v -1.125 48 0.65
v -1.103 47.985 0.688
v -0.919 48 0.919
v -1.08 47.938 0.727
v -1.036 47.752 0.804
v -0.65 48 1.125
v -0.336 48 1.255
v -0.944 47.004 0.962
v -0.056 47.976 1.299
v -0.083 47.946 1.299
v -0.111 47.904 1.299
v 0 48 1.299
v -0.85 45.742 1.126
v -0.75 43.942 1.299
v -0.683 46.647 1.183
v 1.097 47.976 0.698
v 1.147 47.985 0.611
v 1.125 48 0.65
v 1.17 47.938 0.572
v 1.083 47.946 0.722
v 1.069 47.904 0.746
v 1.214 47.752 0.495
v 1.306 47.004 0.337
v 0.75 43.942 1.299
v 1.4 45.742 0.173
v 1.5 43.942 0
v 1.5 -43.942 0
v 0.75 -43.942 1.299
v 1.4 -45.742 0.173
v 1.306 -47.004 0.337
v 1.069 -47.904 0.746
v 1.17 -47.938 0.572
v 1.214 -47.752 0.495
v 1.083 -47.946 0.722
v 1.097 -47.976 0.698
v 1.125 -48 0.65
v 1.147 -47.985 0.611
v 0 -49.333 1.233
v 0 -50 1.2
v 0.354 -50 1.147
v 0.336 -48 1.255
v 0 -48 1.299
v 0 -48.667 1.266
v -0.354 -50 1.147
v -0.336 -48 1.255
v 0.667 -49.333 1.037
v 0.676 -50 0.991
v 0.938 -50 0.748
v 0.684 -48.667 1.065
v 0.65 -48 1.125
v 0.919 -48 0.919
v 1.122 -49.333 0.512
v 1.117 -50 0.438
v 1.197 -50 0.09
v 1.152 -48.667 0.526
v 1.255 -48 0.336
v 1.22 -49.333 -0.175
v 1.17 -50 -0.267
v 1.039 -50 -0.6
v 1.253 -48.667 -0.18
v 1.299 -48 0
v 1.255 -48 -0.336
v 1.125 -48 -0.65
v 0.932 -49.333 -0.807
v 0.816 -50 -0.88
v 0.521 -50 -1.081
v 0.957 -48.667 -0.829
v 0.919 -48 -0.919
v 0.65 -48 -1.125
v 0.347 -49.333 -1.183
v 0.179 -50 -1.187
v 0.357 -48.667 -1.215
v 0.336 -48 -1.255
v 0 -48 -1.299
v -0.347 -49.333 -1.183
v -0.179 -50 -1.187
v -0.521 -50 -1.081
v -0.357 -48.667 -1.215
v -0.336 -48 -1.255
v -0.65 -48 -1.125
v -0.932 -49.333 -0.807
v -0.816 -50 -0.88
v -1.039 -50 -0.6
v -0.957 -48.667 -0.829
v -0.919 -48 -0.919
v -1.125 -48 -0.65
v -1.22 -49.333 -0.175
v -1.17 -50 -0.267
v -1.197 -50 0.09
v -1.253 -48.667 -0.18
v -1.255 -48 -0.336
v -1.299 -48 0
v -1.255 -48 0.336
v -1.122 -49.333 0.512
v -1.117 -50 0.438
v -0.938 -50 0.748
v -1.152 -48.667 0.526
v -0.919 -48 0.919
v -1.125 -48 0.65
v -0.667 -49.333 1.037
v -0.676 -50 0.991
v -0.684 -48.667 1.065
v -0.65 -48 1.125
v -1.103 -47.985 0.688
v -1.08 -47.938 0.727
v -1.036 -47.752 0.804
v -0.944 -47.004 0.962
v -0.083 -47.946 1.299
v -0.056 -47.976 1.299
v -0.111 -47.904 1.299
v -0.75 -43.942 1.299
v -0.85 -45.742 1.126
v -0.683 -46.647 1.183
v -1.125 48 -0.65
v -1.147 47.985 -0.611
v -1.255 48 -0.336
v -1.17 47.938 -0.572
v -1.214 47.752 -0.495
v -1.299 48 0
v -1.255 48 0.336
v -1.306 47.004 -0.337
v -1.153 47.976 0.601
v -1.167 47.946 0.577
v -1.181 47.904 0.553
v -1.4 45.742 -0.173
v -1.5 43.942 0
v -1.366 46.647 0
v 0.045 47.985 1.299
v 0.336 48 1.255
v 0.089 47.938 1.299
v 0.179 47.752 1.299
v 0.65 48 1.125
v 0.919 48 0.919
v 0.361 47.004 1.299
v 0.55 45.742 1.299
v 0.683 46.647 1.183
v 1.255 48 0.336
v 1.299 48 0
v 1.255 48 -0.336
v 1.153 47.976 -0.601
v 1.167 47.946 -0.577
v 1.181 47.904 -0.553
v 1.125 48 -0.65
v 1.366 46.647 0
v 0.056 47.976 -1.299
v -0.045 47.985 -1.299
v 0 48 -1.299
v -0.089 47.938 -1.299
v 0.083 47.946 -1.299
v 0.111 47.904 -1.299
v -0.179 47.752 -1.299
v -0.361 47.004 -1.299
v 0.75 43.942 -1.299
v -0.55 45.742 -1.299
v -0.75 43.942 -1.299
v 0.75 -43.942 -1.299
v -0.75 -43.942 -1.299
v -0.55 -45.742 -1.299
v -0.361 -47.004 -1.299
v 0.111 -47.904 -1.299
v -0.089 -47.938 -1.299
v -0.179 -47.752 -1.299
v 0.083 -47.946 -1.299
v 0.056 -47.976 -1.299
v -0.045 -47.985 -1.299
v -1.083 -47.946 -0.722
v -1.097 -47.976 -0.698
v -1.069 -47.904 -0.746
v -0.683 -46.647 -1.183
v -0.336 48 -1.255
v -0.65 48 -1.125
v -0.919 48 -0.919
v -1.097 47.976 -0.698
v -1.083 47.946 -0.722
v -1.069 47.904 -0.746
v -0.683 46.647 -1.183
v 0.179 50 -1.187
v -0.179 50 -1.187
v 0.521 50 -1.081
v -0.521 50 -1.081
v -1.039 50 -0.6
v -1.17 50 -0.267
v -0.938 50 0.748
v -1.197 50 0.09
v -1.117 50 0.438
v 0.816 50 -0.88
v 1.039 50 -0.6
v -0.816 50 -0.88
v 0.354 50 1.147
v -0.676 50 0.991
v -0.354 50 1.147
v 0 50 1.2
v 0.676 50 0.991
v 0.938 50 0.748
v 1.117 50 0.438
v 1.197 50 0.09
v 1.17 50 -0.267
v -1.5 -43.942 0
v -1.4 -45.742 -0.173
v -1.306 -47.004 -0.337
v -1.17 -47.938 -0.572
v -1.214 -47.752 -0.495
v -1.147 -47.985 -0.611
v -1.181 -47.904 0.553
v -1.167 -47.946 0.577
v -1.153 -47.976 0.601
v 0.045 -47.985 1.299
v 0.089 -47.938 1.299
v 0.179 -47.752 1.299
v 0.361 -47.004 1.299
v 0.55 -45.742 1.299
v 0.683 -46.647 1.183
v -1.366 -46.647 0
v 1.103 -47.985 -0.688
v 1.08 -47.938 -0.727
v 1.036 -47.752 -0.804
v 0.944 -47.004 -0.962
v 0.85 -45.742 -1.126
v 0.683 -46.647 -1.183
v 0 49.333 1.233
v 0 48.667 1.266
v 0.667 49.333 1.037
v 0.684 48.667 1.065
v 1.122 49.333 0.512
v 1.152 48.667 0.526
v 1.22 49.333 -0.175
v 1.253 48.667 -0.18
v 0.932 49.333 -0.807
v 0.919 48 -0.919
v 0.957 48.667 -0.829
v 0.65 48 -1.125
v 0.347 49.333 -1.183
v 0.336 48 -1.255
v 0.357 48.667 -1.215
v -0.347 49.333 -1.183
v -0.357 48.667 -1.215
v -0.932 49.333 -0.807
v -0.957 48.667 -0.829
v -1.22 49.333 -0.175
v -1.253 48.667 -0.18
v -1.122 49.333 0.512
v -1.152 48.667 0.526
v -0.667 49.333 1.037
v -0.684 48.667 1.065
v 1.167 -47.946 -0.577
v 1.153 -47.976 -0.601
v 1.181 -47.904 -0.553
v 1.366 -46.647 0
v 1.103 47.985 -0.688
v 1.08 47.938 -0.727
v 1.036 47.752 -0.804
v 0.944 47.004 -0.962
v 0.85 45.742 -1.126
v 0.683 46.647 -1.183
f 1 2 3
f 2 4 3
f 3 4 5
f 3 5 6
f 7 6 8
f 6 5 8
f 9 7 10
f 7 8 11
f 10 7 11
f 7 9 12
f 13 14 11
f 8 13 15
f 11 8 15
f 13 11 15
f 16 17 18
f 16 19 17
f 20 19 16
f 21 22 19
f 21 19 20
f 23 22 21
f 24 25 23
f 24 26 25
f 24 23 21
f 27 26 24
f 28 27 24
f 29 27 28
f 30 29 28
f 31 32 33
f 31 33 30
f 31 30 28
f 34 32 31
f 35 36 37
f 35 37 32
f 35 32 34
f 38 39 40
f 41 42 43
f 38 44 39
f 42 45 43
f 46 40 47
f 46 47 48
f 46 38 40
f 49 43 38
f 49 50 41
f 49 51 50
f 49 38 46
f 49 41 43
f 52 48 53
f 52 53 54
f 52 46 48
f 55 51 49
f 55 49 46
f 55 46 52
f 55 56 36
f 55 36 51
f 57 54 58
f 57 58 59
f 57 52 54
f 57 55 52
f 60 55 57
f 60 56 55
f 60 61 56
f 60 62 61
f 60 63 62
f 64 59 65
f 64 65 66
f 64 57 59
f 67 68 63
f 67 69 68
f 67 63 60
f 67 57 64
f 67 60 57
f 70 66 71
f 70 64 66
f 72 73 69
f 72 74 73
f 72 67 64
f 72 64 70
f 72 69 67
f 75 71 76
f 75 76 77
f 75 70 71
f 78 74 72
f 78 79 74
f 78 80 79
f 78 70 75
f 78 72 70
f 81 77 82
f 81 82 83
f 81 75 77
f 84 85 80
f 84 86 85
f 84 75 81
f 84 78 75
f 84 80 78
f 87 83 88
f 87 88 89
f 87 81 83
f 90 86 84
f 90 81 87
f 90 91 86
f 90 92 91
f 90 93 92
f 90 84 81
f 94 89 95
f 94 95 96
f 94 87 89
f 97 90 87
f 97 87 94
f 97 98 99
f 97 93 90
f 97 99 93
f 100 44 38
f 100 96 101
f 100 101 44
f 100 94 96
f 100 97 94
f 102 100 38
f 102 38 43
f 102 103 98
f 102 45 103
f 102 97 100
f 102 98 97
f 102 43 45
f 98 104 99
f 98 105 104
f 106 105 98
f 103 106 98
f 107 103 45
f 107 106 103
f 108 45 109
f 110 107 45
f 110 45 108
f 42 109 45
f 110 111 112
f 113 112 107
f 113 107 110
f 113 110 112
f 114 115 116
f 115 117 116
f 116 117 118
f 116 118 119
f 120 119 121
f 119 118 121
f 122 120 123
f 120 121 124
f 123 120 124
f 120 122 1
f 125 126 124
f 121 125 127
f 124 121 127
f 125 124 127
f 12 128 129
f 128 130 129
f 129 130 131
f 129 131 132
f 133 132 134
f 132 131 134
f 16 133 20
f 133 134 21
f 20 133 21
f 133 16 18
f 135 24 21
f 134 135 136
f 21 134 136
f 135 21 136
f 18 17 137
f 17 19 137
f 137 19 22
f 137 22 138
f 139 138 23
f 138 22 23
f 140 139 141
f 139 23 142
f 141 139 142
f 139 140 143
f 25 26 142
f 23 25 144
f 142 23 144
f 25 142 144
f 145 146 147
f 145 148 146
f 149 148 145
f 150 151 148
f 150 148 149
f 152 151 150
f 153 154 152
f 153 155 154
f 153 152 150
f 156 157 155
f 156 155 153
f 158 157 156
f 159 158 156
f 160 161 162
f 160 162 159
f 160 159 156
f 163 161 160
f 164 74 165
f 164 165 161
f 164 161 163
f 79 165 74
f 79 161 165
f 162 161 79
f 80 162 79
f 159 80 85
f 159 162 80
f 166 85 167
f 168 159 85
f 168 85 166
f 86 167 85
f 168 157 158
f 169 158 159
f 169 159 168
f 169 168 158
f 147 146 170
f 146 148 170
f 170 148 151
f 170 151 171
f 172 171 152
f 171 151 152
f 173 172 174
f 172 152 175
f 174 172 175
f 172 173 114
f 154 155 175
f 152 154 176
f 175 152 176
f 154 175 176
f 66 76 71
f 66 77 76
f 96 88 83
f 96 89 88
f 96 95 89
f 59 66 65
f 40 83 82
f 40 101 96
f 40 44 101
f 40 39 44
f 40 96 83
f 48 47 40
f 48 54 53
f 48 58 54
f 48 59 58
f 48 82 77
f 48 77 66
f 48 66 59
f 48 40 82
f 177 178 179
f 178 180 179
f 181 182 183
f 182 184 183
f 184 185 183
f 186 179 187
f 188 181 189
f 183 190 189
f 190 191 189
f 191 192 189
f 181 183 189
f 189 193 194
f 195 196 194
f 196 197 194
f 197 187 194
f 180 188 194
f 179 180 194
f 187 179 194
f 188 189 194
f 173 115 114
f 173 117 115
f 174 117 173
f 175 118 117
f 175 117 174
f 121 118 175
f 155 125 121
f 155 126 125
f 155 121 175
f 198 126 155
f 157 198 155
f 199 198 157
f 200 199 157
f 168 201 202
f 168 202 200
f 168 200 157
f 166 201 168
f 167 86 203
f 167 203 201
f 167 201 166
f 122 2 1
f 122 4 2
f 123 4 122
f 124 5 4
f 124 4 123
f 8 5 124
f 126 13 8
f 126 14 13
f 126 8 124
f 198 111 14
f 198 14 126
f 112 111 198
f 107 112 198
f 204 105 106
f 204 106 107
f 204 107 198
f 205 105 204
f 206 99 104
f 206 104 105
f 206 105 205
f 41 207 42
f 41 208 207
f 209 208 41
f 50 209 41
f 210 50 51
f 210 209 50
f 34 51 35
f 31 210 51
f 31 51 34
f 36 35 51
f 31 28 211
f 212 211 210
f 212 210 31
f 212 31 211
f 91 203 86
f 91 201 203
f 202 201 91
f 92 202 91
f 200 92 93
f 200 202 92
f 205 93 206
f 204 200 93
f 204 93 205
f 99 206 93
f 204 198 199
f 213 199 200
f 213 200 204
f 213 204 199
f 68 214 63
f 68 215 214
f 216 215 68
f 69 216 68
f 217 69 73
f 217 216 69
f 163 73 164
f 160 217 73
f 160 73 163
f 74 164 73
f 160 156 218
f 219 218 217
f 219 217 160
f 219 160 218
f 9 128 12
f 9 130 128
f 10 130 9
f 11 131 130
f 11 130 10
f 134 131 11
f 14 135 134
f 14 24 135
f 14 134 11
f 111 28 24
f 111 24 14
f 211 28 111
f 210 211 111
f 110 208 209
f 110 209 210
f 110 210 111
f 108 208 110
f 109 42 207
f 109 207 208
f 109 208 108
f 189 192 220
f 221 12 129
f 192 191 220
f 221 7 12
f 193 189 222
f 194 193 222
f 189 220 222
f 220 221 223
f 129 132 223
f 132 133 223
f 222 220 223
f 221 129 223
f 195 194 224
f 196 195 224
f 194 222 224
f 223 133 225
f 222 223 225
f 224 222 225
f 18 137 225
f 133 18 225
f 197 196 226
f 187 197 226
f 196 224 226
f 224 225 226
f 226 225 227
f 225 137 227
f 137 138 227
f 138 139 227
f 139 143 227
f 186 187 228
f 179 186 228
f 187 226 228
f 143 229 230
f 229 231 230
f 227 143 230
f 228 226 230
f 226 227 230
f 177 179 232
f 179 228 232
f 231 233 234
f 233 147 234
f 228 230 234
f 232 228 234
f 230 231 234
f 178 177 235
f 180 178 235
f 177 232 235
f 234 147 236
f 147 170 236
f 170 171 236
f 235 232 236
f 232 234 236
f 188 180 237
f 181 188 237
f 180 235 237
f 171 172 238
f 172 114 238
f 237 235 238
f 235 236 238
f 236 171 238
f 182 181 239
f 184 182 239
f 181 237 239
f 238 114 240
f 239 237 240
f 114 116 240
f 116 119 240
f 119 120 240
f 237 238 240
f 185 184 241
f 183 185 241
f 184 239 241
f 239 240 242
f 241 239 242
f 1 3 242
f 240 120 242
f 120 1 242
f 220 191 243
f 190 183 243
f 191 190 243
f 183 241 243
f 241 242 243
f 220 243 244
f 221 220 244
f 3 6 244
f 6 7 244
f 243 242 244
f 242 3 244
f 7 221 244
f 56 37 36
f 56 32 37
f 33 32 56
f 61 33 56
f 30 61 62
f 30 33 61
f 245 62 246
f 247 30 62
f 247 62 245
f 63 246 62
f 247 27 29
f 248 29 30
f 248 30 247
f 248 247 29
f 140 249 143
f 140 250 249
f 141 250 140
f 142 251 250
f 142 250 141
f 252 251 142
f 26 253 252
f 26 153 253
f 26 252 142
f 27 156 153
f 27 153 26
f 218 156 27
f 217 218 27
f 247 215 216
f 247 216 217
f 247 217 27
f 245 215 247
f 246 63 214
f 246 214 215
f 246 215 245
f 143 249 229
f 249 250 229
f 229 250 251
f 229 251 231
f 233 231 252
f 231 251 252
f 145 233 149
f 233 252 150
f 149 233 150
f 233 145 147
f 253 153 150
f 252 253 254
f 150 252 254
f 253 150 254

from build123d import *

# Parameters (mm, degrees)
F1_DEPTH = 50


with BuildPart() as f1:
    # F0 (on Front) → F1 (new body)
    with BuildSketch(Plane.XZ):
        Polygon((-0.75, 1.299038), (-1.5, 0), (-0.75, -1.299038), (0.75, -1.299038), (1.5, 0), (0.75, 1.299038), align=None)
    extrude(amount=F1_DEPTH)

    # F2 (on Right) → F3 (revolve, cut)
    with BuildSketch(Plane.YZ):
        Polygon((-51.041506, 1.148426), (-50, 1.2), (-48, 1.299038), (-36.083652, 1.889124), (-51.041506, 1.889124), align=None)
    revolve(axis=Axis((0, 7.533245, 0), (0, 1, 0)), mode=Mode.SUBTRACT)

    # F4: F1 across plane


with BuildPart() as f1_1:
    add(f1.part)
    add(f1.part.mirror(Plane.XZ))


solid = f1_1.part
